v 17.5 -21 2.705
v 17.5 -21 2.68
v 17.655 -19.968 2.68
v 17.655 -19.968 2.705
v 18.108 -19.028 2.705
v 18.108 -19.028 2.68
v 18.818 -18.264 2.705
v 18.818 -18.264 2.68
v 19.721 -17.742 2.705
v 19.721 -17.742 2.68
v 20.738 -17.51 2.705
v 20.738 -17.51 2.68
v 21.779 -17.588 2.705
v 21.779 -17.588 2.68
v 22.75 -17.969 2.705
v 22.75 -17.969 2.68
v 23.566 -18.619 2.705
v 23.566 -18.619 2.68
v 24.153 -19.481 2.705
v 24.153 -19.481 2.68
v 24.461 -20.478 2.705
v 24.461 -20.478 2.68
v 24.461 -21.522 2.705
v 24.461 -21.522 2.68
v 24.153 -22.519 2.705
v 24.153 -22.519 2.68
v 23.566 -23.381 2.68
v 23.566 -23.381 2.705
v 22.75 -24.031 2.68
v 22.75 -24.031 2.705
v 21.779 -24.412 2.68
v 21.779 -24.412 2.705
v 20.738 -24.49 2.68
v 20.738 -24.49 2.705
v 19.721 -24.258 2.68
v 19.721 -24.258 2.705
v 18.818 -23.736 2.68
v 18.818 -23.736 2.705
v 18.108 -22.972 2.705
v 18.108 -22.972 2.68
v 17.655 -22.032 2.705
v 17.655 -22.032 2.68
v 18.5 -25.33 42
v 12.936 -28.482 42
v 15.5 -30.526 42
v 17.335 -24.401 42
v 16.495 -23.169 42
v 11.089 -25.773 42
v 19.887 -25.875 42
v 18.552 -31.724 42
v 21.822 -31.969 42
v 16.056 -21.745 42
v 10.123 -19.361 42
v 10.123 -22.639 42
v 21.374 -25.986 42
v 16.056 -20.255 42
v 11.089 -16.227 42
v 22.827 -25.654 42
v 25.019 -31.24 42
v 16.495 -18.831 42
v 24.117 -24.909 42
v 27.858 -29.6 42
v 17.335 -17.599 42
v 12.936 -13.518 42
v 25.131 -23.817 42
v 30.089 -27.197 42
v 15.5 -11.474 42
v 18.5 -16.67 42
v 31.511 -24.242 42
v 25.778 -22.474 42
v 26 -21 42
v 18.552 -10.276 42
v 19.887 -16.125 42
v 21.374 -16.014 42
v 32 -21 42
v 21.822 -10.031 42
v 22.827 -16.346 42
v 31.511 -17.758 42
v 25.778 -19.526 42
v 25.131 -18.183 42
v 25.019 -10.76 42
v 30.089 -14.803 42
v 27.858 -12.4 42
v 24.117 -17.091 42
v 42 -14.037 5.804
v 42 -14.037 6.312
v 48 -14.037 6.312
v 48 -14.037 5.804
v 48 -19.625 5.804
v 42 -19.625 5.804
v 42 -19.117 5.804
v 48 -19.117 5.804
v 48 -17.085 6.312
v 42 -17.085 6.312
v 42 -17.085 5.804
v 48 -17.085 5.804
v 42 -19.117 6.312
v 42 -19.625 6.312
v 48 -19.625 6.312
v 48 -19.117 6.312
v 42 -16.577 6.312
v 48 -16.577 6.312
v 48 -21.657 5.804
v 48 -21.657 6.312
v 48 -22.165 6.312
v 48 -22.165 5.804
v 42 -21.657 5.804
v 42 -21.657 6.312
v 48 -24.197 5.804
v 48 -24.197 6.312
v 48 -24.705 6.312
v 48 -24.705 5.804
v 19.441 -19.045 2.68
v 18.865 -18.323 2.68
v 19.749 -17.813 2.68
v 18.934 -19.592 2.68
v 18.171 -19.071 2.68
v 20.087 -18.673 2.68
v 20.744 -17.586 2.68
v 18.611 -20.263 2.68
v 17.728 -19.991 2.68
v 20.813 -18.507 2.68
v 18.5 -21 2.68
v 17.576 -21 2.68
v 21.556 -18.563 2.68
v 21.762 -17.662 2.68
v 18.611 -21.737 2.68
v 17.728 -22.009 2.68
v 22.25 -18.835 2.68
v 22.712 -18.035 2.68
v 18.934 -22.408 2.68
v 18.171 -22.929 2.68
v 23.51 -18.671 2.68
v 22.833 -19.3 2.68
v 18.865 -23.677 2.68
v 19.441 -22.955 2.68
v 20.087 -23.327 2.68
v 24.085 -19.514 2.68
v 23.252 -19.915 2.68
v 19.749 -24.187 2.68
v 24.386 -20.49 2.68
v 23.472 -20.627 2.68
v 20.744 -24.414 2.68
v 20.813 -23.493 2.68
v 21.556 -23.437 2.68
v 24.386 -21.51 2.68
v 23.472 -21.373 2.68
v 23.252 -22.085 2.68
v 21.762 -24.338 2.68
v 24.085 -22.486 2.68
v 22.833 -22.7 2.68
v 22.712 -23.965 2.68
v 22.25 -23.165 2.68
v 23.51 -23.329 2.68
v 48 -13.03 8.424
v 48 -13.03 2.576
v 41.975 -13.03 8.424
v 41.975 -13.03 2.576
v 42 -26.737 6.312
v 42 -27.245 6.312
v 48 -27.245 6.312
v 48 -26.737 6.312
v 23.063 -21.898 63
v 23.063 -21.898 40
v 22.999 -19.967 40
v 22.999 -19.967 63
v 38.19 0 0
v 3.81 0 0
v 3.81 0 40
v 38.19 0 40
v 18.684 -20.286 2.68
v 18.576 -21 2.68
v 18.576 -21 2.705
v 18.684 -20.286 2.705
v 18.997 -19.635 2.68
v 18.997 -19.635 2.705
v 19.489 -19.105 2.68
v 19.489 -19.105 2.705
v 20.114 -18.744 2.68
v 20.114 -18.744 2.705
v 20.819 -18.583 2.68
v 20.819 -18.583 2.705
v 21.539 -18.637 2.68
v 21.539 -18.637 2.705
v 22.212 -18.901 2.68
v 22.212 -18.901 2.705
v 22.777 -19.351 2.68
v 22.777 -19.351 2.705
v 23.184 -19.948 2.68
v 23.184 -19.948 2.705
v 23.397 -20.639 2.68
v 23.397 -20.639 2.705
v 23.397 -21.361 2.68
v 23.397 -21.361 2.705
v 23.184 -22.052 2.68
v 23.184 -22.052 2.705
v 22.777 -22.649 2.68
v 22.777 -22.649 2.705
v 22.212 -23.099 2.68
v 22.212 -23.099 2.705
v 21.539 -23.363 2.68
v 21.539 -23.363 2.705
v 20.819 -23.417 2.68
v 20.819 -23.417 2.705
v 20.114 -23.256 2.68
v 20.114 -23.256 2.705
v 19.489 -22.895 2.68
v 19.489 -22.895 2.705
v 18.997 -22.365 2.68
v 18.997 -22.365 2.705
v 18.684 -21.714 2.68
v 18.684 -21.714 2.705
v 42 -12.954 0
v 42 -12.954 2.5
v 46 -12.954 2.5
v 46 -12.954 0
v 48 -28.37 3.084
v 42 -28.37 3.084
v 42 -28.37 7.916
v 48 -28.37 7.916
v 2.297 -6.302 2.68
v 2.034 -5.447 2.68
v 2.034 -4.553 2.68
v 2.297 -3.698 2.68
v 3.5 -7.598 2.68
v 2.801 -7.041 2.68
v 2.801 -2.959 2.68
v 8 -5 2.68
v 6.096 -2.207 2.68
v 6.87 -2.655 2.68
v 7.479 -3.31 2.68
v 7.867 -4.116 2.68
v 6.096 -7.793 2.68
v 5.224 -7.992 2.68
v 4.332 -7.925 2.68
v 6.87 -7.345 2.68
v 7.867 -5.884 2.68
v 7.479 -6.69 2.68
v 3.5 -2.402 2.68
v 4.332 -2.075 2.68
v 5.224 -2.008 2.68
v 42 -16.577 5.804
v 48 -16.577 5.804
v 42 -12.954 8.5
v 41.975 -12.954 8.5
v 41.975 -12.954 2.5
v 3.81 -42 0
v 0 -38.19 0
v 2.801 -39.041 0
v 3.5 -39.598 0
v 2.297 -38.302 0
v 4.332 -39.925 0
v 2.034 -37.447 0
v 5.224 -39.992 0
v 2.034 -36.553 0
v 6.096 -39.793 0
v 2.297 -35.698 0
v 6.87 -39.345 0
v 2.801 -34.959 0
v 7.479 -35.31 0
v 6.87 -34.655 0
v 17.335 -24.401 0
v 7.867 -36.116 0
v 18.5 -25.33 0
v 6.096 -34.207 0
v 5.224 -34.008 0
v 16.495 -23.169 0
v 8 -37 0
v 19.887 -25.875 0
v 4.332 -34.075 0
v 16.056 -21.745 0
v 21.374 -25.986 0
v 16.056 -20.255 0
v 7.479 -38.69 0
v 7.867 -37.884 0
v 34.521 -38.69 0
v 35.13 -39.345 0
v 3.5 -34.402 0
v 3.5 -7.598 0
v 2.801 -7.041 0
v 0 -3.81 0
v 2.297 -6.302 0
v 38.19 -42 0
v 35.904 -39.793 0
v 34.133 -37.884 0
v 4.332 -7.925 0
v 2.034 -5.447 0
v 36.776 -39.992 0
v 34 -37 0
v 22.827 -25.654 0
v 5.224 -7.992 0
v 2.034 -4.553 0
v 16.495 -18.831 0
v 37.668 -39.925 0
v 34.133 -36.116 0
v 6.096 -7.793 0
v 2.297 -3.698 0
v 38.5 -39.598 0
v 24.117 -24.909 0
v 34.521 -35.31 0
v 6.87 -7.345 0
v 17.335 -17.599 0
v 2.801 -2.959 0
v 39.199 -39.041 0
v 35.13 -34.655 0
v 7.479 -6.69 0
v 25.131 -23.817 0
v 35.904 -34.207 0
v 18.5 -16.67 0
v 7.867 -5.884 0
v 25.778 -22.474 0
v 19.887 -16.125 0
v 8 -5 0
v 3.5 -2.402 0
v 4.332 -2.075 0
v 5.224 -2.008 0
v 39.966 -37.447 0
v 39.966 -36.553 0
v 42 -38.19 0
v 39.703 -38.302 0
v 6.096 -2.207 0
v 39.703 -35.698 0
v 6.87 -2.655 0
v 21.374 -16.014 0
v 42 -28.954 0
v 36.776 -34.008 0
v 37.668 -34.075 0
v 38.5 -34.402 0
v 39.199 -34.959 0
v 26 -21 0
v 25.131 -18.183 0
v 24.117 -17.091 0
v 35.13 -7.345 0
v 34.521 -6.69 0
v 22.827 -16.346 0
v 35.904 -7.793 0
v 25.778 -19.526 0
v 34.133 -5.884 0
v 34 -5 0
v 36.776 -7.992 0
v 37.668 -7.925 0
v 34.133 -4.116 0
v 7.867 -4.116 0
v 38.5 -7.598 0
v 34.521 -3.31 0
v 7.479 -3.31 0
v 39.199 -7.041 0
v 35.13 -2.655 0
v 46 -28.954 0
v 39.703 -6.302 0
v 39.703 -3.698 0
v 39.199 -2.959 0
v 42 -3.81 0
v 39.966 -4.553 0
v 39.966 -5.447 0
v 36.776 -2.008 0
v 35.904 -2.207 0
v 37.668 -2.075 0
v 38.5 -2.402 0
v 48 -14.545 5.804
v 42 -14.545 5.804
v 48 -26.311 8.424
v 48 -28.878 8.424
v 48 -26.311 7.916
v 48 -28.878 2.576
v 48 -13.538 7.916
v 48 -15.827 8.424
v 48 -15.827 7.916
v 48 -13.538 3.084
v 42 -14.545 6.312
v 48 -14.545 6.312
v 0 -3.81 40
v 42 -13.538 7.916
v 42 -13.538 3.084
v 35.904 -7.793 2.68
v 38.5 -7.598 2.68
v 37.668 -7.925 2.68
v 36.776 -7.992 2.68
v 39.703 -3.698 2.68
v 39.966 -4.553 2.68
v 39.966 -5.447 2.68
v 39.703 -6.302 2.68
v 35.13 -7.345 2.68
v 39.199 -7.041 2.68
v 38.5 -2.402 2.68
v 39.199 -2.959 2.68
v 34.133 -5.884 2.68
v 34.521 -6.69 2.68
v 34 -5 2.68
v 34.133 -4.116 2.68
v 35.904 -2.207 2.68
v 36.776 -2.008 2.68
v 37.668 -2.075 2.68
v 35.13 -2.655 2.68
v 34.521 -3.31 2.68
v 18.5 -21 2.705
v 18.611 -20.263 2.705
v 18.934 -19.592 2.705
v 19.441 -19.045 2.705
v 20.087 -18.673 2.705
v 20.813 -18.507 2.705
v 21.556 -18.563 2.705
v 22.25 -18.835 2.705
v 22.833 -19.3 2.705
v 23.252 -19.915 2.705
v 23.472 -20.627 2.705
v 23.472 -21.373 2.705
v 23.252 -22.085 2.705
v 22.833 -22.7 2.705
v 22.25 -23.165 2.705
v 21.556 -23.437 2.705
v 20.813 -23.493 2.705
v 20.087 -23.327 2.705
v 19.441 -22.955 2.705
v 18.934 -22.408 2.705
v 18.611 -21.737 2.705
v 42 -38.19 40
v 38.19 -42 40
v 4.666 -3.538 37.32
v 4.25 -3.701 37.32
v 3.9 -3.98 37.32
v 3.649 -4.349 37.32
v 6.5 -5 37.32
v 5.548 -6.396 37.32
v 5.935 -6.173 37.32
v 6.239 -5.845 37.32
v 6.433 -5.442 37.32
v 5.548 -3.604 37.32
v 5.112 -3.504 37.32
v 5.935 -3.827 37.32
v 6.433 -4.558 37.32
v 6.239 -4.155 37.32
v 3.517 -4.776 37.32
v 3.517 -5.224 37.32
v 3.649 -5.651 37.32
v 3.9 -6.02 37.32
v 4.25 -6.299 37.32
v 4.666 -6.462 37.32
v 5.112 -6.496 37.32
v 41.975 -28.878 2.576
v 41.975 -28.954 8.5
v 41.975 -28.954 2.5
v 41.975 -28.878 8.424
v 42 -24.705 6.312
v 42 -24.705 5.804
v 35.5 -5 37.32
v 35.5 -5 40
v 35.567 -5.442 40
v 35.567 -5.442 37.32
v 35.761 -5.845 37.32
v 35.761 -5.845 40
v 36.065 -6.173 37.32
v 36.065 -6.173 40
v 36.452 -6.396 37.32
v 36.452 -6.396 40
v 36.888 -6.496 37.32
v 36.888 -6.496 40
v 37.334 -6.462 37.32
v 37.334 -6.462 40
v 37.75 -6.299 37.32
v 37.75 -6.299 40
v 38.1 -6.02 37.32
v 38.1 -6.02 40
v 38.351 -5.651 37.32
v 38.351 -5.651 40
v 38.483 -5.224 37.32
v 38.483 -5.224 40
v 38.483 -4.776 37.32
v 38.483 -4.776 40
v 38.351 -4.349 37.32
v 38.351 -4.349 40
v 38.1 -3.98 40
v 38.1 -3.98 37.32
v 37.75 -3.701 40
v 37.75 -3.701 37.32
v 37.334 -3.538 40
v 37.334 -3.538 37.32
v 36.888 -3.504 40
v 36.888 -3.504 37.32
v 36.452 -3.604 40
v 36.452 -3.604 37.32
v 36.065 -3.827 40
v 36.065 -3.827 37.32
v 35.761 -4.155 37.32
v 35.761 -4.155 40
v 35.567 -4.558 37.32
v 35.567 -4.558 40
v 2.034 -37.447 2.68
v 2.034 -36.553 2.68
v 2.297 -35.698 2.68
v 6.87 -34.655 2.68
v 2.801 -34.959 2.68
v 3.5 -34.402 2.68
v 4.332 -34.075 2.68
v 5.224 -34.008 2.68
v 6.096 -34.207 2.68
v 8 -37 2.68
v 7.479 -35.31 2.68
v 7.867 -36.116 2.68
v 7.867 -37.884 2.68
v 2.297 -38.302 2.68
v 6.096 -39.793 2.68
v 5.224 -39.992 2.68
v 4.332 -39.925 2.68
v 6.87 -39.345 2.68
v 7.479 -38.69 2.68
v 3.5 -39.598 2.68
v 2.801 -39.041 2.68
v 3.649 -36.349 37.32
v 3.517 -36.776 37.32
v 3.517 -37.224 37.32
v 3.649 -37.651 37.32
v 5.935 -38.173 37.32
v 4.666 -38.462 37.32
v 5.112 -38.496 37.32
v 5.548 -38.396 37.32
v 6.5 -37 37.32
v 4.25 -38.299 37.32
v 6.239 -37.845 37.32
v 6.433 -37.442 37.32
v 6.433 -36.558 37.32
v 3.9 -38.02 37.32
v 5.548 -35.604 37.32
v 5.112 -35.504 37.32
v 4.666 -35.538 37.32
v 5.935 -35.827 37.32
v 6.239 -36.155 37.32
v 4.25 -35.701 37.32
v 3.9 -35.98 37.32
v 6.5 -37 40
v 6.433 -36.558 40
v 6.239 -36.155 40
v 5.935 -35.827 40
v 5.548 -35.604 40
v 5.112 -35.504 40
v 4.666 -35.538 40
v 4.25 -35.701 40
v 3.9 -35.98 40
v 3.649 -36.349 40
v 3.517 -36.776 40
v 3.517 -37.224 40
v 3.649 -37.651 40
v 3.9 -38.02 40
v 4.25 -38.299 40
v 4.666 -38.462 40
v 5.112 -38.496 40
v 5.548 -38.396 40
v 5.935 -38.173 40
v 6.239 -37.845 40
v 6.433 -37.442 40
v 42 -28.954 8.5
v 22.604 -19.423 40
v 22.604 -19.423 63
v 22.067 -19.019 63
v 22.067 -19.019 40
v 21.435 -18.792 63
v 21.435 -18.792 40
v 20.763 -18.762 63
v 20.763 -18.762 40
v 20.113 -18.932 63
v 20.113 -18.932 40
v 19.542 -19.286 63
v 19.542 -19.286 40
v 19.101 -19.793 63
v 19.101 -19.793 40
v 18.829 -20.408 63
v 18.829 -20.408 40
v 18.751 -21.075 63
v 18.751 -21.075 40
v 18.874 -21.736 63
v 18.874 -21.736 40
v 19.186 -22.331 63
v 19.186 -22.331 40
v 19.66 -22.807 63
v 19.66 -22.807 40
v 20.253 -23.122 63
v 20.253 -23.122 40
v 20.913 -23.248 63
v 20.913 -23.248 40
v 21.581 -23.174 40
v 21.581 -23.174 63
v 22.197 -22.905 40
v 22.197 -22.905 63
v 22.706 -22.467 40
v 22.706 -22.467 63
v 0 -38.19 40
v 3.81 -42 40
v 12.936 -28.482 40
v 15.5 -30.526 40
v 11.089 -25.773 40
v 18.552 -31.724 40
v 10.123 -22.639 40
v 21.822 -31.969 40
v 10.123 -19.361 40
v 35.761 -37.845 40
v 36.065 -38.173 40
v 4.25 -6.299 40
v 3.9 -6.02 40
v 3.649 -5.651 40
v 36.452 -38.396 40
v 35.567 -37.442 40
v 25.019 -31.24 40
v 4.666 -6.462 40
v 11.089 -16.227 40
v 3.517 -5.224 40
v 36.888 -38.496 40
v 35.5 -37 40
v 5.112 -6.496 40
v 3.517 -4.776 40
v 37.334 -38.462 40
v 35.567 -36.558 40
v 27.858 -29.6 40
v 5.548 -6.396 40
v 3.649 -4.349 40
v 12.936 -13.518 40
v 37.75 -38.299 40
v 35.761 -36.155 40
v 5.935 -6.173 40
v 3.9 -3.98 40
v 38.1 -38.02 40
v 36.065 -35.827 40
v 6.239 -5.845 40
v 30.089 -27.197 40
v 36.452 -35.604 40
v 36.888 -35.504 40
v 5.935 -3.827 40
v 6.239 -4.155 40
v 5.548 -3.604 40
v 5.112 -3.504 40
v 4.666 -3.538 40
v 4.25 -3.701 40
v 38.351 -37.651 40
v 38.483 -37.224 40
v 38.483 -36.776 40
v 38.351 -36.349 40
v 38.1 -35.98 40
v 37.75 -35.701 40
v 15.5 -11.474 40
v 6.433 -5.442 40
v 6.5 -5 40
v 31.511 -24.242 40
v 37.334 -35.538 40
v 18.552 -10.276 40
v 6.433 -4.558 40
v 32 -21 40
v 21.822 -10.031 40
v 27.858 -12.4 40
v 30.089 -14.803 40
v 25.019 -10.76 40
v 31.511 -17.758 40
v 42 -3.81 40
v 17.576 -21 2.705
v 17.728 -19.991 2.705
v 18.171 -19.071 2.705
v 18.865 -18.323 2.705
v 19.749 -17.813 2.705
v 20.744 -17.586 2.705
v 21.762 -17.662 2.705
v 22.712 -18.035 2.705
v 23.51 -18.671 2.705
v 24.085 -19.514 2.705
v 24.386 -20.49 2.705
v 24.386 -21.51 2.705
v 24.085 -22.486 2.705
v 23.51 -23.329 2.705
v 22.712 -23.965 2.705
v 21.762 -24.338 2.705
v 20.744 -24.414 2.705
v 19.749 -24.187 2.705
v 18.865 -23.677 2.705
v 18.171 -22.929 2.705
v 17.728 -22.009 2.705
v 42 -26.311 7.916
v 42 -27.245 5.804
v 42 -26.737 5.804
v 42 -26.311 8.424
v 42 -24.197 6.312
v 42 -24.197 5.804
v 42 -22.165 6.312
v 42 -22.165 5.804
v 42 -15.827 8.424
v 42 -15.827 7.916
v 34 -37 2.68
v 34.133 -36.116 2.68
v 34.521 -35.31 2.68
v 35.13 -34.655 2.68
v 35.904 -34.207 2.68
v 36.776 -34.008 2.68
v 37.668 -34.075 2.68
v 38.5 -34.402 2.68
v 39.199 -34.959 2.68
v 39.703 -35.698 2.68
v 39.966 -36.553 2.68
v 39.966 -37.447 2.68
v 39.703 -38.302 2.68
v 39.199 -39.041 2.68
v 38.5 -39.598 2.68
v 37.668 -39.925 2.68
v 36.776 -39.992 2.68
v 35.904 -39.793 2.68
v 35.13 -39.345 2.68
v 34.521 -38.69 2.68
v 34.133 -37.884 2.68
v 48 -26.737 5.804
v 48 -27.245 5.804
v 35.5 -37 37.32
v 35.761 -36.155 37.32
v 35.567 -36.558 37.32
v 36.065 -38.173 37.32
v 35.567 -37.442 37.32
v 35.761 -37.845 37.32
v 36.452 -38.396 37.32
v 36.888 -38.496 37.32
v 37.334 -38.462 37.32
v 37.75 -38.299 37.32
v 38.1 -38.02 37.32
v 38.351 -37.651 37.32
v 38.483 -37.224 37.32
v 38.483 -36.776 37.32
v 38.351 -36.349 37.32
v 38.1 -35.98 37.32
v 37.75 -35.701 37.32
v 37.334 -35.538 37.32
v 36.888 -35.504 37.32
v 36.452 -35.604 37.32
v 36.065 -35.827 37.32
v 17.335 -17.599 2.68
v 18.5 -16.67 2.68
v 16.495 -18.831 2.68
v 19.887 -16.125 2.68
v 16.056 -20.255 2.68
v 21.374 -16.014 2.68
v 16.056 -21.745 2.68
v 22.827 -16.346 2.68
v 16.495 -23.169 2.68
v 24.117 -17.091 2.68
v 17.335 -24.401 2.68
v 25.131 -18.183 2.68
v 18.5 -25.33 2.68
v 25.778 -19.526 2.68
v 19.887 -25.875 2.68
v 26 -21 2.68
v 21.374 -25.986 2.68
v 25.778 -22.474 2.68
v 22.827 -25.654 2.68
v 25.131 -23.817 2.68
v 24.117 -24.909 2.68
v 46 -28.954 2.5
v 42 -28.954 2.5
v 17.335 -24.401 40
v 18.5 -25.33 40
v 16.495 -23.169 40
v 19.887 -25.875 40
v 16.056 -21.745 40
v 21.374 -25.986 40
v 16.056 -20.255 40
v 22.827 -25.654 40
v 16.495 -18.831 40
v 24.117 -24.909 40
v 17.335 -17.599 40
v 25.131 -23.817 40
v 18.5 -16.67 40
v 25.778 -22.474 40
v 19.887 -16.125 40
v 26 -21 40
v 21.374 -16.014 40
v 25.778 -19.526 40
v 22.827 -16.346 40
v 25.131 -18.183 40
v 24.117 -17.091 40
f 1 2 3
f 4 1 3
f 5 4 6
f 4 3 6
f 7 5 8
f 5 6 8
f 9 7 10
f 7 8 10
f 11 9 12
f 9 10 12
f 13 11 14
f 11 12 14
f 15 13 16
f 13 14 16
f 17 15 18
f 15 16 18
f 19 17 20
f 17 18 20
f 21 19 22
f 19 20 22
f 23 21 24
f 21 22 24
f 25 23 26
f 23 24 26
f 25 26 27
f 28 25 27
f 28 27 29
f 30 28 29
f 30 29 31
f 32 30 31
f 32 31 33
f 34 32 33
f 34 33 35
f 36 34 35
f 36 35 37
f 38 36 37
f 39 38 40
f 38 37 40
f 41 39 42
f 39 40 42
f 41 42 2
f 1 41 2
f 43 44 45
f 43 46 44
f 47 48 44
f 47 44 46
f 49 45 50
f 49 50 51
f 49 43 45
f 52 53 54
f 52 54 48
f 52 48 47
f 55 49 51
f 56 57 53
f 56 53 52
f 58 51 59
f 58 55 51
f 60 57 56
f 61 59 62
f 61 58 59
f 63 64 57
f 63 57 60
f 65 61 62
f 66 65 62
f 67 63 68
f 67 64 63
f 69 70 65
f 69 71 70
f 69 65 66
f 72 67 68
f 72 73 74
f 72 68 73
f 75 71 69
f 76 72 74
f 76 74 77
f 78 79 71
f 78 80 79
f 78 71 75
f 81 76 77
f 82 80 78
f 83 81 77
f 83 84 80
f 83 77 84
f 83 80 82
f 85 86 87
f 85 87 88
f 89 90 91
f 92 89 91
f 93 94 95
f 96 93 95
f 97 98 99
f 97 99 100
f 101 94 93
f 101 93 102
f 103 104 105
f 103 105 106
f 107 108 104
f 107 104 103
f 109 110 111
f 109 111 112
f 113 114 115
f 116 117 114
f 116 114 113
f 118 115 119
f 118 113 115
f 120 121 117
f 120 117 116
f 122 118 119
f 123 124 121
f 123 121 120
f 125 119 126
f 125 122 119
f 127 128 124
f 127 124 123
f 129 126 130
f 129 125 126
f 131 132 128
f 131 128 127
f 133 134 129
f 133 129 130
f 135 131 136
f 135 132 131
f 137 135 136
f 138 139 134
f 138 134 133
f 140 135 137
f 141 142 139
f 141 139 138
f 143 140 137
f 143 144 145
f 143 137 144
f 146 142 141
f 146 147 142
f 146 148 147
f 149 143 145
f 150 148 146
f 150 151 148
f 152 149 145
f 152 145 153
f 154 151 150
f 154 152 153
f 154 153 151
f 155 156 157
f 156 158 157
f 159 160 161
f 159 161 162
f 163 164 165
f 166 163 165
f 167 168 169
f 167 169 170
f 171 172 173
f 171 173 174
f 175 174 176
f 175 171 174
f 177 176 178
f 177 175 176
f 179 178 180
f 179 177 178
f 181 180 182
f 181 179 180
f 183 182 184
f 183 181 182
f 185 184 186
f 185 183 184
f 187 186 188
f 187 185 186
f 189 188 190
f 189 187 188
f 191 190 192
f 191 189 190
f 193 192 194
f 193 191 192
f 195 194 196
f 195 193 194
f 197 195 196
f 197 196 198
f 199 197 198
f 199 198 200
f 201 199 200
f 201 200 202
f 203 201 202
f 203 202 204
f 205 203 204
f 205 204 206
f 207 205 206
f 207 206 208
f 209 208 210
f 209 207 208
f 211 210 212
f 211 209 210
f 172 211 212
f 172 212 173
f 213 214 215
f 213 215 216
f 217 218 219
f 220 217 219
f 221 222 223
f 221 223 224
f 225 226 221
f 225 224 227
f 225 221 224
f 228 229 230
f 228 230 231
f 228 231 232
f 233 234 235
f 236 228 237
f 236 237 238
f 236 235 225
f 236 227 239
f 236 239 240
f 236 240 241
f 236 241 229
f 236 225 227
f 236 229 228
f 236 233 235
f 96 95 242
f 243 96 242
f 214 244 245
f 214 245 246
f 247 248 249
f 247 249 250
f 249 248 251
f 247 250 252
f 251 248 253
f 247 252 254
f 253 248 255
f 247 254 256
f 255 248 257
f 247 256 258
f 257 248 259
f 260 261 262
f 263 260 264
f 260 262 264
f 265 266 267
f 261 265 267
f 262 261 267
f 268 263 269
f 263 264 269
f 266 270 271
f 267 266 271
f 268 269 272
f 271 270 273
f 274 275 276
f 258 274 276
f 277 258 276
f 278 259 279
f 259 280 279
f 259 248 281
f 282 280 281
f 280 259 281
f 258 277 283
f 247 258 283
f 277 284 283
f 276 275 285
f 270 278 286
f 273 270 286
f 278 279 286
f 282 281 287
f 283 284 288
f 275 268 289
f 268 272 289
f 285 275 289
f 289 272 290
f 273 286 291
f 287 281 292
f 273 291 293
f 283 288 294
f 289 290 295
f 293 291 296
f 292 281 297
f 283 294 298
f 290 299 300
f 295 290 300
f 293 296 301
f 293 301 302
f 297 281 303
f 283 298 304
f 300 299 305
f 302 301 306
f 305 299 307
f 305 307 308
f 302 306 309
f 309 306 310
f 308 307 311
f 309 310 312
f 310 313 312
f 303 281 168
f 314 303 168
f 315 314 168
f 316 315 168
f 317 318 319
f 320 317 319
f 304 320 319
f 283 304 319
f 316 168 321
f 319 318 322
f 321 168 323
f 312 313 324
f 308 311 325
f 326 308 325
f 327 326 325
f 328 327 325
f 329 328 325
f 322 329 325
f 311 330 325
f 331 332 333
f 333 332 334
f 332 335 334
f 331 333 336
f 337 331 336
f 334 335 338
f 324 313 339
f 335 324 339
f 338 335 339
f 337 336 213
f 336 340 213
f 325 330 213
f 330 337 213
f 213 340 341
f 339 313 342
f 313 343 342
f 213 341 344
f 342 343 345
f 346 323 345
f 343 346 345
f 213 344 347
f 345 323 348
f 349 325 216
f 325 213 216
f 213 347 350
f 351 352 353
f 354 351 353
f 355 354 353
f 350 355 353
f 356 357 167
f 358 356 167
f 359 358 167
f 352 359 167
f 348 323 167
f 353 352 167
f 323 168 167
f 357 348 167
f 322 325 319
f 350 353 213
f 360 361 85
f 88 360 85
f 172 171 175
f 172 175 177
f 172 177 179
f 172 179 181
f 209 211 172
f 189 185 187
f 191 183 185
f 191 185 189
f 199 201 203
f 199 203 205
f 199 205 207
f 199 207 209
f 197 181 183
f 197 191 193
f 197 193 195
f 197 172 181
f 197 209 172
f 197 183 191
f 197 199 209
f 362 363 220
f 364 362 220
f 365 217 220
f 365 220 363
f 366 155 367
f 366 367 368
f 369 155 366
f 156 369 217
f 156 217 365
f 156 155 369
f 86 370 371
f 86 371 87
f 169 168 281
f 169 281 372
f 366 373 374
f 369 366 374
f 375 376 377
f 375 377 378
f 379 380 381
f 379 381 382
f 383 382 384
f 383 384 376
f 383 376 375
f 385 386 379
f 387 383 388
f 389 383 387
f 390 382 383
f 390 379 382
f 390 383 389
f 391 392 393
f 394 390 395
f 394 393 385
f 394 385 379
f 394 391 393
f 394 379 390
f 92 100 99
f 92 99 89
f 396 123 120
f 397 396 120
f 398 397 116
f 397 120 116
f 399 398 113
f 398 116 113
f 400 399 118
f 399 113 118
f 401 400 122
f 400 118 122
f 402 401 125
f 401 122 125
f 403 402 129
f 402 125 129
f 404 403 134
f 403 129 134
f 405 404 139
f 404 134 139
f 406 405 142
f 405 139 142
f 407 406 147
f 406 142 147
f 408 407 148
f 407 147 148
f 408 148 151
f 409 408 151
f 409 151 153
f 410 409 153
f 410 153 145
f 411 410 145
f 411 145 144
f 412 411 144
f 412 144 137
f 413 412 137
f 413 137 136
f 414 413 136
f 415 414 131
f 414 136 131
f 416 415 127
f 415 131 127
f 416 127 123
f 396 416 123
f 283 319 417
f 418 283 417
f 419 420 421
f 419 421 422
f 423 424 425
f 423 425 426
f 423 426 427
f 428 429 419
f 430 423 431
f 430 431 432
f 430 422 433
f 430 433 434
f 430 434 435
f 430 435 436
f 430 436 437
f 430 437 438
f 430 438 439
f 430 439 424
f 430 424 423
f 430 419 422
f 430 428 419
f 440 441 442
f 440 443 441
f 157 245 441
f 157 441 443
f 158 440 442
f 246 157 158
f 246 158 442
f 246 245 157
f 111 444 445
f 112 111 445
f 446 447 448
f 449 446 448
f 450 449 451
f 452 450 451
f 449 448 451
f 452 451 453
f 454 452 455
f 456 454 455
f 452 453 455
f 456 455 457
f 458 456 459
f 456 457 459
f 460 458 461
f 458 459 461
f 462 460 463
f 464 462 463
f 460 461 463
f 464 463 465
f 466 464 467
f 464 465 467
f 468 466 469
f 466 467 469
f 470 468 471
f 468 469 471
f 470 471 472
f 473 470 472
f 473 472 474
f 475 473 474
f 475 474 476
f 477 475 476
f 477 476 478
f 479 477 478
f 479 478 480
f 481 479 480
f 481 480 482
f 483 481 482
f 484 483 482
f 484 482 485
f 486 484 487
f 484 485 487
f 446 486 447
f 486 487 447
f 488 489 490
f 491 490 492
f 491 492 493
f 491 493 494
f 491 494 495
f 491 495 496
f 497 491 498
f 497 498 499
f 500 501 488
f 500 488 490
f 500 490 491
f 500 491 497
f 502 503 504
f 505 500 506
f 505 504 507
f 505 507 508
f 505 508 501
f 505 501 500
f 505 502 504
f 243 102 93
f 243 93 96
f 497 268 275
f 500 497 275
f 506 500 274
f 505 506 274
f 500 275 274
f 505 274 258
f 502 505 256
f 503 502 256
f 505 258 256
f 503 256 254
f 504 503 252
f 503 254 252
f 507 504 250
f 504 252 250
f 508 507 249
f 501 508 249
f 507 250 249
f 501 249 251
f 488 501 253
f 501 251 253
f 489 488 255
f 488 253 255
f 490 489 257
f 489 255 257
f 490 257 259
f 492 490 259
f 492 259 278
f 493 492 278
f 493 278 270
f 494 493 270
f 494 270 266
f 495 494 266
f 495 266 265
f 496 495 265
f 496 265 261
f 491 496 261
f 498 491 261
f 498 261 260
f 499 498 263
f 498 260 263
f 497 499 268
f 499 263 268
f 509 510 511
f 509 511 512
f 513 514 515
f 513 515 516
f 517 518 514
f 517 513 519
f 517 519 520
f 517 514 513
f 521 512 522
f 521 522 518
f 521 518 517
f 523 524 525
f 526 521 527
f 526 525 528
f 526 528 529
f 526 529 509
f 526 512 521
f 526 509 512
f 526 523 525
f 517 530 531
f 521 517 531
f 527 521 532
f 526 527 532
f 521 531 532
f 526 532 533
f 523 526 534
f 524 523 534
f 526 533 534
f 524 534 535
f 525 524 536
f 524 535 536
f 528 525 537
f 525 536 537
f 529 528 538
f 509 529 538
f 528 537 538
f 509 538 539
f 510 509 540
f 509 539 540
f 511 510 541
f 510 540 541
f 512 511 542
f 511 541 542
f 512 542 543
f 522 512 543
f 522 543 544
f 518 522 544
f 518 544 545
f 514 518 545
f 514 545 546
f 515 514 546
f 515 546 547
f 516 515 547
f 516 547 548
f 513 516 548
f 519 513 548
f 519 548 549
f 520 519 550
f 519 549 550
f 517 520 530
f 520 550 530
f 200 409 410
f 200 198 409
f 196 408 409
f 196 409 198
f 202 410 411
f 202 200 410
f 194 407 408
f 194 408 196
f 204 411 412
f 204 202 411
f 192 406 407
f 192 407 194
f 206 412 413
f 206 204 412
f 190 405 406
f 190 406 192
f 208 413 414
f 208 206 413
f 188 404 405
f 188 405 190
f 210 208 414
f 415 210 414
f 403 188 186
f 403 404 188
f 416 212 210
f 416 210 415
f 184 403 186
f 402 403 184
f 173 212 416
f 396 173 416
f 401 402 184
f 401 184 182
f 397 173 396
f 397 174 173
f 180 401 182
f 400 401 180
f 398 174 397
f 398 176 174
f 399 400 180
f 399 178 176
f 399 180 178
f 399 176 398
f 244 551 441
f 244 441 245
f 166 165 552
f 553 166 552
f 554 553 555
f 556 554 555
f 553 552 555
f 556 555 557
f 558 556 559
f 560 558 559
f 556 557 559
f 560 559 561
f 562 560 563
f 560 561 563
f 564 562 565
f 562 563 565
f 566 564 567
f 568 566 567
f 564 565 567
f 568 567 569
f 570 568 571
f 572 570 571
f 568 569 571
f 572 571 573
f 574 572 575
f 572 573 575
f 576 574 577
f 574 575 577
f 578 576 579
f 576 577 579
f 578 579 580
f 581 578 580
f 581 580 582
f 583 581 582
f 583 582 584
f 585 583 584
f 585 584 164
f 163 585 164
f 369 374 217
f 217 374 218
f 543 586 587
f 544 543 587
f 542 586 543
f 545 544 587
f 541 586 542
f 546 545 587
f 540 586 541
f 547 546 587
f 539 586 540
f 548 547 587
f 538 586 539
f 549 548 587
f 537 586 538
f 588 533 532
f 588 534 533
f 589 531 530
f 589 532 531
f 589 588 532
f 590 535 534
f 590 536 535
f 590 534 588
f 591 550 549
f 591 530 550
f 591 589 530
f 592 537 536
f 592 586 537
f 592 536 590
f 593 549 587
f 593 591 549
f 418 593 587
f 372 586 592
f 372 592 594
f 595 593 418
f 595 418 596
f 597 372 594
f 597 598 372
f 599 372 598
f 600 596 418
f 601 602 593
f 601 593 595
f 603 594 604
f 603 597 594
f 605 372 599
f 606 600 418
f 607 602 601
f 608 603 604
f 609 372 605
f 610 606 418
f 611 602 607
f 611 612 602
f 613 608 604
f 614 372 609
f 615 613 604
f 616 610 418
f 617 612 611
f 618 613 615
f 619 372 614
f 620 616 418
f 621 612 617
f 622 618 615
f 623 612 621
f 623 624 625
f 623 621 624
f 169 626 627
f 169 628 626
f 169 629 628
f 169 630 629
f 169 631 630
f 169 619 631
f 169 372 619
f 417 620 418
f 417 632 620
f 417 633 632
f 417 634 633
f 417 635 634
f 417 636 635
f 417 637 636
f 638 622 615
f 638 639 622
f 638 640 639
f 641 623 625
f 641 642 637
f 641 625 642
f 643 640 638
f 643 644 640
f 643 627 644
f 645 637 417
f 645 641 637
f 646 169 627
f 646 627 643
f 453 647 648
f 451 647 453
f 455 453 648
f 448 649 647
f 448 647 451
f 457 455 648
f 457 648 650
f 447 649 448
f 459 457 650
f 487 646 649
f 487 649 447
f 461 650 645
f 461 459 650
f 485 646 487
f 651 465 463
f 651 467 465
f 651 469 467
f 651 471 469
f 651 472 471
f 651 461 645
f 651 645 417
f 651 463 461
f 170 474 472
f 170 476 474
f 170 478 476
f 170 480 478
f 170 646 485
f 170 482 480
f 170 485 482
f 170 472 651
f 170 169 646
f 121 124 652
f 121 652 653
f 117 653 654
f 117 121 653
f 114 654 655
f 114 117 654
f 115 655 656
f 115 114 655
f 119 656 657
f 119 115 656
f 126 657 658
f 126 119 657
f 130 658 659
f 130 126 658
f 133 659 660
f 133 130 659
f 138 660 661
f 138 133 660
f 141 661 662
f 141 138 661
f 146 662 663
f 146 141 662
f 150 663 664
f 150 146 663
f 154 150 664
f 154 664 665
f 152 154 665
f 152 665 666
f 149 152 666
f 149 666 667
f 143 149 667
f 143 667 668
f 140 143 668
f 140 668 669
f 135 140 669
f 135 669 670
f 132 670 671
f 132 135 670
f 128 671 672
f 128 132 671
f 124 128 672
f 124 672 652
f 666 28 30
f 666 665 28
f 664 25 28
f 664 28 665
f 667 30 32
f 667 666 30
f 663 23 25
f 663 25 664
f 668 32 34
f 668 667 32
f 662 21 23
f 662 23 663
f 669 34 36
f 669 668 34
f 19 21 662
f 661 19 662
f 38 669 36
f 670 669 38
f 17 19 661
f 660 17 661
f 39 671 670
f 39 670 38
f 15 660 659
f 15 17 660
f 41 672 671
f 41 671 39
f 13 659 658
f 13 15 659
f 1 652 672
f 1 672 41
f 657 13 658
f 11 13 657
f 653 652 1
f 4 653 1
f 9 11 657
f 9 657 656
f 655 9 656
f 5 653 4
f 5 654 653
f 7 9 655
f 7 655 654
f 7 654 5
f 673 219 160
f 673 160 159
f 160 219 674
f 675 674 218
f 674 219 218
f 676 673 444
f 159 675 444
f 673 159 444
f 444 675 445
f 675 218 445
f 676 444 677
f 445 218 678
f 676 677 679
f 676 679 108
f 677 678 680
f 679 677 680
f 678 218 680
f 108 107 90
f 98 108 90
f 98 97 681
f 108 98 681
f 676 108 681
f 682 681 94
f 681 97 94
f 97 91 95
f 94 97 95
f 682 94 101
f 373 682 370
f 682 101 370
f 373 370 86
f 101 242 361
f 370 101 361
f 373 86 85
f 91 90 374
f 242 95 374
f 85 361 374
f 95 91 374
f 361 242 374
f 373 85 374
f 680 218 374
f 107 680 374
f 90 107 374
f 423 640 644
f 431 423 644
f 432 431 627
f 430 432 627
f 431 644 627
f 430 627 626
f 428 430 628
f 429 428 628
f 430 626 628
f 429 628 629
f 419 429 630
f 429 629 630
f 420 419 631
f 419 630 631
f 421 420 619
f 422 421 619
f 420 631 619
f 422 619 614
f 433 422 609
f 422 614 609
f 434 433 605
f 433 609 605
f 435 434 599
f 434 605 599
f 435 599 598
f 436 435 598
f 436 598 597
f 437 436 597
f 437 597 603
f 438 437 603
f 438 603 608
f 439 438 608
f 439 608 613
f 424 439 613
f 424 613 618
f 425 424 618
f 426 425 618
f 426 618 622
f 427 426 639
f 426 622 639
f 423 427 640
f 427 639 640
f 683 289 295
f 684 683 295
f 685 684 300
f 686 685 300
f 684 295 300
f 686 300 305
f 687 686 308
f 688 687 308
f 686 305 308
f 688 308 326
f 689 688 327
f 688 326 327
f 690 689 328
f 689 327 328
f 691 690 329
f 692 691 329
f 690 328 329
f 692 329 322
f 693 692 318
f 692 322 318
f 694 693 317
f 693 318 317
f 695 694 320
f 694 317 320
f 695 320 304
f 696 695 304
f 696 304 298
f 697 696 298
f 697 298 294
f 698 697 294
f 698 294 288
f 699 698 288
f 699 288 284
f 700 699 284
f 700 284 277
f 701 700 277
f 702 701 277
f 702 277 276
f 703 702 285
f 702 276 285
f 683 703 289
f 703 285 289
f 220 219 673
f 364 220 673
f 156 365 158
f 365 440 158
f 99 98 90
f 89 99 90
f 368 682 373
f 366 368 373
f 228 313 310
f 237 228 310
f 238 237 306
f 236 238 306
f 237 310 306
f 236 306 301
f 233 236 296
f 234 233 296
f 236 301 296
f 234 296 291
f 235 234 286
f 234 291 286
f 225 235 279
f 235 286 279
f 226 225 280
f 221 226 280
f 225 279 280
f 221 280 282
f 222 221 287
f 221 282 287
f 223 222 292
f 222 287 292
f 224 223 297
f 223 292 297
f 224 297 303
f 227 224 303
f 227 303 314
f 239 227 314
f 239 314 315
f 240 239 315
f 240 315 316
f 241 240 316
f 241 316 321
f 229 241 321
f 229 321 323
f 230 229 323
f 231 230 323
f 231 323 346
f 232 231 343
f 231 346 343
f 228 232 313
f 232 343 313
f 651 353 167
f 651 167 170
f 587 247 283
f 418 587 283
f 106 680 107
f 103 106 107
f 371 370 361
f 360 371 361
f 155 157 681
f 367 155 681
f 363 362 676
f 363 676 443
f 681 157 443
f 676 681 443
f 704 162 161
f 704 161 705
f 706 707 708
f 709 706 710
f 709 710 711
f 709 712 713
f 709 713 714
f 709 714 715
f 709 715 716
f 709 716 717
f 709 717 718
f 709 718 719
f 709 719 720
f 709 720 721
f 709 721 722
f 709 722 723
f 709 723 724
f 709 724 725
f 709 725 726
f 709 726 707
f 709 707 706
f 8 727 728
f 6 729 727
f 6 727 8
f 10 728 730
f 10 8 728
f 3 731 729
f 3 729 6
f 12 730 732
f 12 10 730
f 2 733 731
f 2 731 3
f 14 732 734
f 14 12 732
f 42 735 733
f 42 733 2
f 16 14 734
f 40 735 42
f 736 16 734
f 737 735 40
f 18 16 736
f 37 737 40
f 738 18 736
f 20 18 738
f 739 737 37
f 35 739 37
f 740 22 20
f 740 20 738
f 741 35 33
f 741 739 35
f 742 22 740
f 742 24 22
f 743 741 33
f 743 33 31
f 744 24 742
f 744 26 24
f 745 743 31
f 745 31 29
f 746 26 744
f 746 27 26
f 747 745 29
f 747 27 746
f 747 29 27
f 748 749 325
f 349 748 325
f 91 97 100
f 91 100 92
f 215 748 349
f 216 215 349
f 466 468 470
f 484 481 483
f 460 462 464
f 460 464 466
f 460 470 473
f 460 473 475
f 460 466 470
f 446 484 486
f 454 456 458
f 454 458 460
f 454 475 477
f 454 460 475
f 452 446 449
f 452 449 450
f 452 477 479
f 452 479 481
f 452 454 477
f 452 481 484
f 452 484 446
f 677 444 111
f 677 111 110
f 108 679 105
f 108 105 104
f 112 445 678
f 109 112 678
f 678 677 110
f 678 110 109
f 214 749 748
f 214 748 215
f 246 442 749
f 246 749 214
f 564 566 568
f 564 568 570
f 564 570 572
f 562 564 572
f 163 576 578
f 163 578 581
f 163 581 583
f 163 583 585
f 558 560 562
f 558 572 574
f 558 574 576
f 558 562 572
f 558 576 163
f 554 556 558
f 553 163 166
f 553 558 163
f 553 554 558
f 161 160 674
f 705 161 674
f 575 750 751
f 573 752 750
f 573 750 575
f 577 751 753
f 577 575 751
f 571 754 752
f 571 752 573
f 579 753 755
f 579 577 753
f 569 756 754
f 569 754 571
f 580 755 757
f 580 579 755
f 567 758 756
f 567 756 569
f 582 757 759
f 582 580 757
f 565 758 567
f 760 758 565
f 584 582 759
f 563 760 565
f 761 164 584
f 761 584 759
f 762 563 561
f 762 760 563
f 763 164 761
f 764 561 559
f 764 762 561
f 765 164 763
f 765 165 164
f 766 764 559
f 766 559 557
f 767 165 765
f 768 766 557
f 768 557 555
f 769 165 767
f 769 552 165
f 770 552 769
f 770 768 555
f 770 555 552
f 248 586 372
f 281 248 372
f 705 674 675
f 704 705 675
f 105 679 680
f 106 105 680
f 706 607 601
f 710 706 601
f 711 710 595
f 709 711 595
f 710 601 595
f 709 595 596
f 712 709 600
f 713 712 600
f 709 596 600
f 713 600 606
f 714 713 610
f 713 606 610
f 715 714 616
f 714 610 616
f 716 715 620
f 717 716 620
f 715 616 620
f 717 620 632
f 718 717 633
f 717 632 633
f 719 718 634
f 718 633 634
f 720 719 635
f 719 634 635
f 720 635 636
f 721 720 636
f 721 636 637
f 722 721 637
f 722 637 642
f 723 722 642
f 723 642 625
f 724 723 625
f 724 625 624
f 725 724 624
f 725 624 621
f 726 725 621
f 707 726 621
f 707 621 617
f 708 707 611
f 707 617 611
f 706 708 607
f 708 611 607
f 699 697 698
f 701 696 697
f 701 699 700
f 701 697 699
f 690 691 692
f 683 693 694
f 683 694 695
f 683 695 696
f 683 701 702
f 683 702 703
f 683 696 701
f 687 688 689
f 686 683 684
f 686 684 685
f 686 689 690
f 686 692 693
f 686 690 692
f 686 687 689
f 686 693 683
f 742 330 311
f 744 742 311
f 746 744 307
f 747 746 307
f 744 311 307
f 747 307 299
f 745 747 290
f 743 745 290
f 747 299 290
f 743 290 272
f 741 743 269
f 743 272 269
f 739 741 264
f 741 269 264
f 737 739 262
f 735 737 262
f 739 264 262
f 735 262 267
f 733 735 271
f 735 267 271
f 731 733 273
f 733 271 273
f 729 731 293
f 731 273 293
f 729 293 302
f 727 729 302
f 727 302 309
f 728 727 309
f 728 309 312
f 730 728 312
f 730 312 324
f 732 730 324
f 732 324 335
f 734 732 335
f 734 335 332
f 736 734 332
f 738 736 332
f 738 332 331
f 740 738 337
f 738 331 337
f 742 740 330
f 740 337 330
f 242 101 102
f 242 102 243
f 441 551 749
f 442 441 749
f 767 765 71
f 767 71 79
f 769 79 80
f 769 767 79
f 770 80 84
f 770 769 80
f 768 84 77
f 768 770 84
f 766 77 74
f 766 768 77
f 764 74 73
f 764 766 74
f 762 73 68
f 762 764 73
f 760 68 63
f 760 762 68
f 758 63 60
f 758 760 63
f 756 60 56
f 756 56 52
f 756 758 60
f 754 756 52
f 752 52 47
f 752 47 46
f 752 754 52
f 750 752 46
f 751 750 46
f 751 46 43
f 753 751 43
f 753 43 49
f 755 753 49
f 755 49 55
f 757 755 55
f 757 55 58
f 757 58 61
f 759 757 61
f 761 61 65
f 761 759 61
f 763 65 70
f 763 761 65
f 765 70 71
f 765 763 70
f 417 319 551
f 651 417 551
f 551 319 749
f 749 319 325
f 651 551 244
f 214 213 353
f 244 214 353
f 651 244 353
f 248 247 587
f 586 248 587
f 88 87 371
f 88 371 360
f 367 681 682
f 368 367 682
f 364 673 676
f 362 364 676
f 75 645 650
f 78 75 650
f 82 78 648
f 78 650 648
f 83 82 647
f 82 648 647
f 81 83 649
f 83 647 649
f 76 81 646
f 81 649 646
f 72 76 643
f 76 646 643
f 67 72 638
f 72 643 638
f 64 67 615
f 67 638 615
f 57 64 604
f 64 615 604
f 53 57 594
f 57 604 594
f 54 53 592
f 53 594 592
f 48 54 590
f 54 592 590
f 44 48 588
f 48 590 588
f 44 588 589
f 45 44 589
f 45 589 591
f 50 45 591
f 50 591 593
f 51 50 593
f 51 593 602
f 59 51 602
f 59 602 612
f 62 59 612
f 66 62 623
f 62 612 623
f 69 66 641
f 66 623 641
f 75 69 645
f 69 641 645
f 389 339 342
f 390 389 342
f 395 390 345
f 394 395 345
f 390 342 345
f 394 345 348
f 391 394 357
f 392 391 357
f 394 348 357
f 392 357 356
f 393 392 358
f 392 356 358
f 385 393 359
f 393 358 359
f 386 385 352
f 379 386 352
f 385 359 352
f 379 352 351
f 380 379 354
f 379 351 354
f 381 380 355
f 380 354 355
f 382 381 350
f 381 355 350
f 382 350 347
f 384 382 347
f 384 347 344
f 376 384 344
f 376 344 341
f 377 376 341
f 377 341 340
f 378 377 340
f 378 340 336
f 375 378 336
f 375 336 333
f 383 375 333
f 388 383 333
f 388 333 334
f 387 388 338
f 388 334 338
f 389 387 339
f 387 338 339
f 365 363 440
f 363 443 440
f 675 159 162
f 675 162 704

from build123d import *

# Parameters (mm, degrees)
SKETCH1_W           = 42
SKETCH1_H           = 42
BOSS_EXTRUDE1_DEPTH = 40
SKETCH2_R           = 11
SKETCH2_R_2         = 5
BOSS_EXTRUDE2_DEPTH = 2
BOSS_EXTRUDE3_DEPTH = 23
SKETCH4_R           = 1.5
CUT_EXTRUDE1_DEPTH  = 2.68
SKETCH5_R           = 3
CUT_EXTRUDE2_DEPTH  = 2.68
SKETCH6_R           = 5
CUT_EXTRUDE3_DEPTH  = 2.68
SKETCH7_R           = 3.5
SKETCH7_R_2         = 3.4238
SKETCH7_R_3         = 2.5
SKETCH7_R_4         = 2.4238
CUT_EXTRUDE4_DEPTH  = 0.0254
CHAMFER1_SIZE       = 3.81
SKETCH8_W           = 2.5
SKETCH8_H           = 16
BOSS_EXTRUDE4_DEPTH = 4
SKETCH9_W           = 6
SKETCH9_H           = 16
SKETCH9_W_2         = 5.8476
SKETCH9_H_2         = 15.8476
CUT_EXTRUDE5_DEPTH  = 0.0254
SKETCH10_W          = 0.508
SKETCH10_H          = 0.508
BOSS_EXTRUDE5_DEPTH = 6


with BuildPart() as part:
    # Sketch1 → Boss-Extrude1 (new body)
    with BuildSketch(Plane.XY):
        with Locations((21, -21)):
            Rectangle(SKETCH1_W, SKETCH1_H)
    extrude(amount=BOSS_EXTRUDE1_DEPTH)

    # Sketch2 → Boss-Extrude2 (add)
    with BuildSketch(Plane.XY.offset(40)):
        with Locations((21, -21)):
            Circle(SKETCH2_R)
        with Locations((21, -21)):
            Circle(SKETCH2_R_2, mode=Mode.SUBTRACT)
    extrude(amount=BOSS_EXTRUDE2_DEPTH)

    # Sketch3 → Boss-Extrude3 (add)
    with BuildSketch(Plane.XY.offset(40)):
        with BuildLine():
            Line((23.063065241, -21.897920826), (22.998678024, -19.966662613))
            ThreePointArc((22.998678024, -19.966662613), (18.751249422, -21.074972259), (23.063065241, -21.897920826))
        make_face()
    extrude(amount=BOSS_EXTRUDE3_DEPTH)

    # Sketch4 → Cut-Extrude1 (cut)
    with BuildSketch(Plane.XY.offset(40)):
        with Locations((5, -5)):
            Circle(SKETCH4_R)
        with Locations((5, -37)):
            Circle(SKETCH4_R)
        with Locations(Location((37, -5, 0), (0, 0, 180))):
            Circle(SKETCH4_R)
        with Locations(Location((37, -37, 0), (0, 0, 180))):
            Circle(SKETCH4_R)
    extrude(amount=-CUT_EXTRUDE1_DEPTH, mode=Mode.SUBTRACT)

    # Sketch5 → Cut-Extrude2 (cut)
    with BuildSketch(Plane(origin=(0, 0, 0), x_dir=(-1, 0, 0), z_dir=(0, 0, -1))):
        with Locations((-37, -5)):
            Circle(SKETCH5_R)
        with Locations((-37, -37)):
            Circle(SKETCH5_R)
        with Locations(Location((-5, -37, 0), (0, 0, 180))):
            Circle(SKETCH5_R)
        with Locations(Location((-5, -5, 0), (0, 0, 180))):
            Circle(SKETCH5_R)
    extrude(amount=-CUT_EXTRUDE2_DEPTH, mode=Mode.SUBTRACT)

    # Sketch6 → Cut-Extrude3 (cut)
    with BuildSketch(Plane(origin=(0, 0, 0), x_dir=(-1, 0, 0), z_dir=(0, 0, -1))):
        with Locations(Location((-21, -21, 0), (0, 0, 180))):
            Circle(SKETCH6_R)
    extrude(amount=-CUT_EXTRUDE3_DEPTH, mode=Mode.SUBTRACT)

    # Sketch7 → Cut-Extrude4 (cut)
    # profile 1 of 2: a face of its own
    with BuildSketch(Plane(origin=(0, 0, 2.68), x_dir=(-1, 0, 0), z_dir=(0, 0, -1))):
        with Locations((-21, -21)):
            Circle(SKETCH7_R)
        with Locations((-21, -21)):
            Circle(SKETCH7_R_2, mode=Mode.SUBTRACT)
    # profile 2 of 2: a face of its own
    with BuildSketch(Plane(origin=(0, 0, 2.68), x_dir=(-1, 0, 0), z_dir=(0, 0, -1))):
        with Locations((-21, -21)):
            Circle(SKETCH7_R_3)
        with Locations((-21, -21)):
            Circle(SKETCH7_R_4, mode=Mode.SUBTRACT)
    extrude(amount=-CUT_EXTRUDE4_DEPTH, mode=Mode.SUBTRACT)

    # Chamfer1
    chamfer1_edges = [part.edges().sort_by_distance(p)[0] for p in [
        (0, 0, 20),
        (42, 0, 20),
        (42, -42, 20),
        (0, -42, 20),
    ]]
    chamfer(chamfer1_edges, length=CHAMFER1_SIZE)

    # Sketch8 → Boss-Extrude4 (add)
    with BuildSketch(Plane(origin=(42, 0, 0), x_dir=(0, 0, -1), z_dir=(1, 0, 0))):
        with Locations((-1.25, -20.954)):
            Rectangle(SKETCH8_W, SKETCH8_H)
    extrude(amount=BOSS_EXTRUDE4_DEPTH)

    # Sketch9 → Cut-Extrude5 (cut)
    with BuildSketch(Plane(origin=(42, 0, 0), x_dir=(0, 0, -1), z_dir=(1, 0, 0))):
        with Locations((-5.5, -20.954)):
            Rectangle(SKETCH9_W, SKETCH9_H)
        with Locations((-5.5, -20.954)):
            Rectangle(SKETCH9_W_2, SKETCH9_H_2, mode=Mode.SUBTRACT)
    extrude(amount=-CUT_EXTRUDE5_DEPTH, mode=Mode.SUBTRACT)

    # Sketch10 → Boss-Extrude5 (add)
    with BuildSketch(Plane(origin=(42, 0, 0), x_dir=(0, 0, -1), z_dir=(1, 0, 0))):
        Polygon((-7.9158, -28.3698), (-7.9158, -26.311363573), (-8.4238, -26.311363573), (-8.4238, -28.8778), (-2.5762, -28.8778), (-2.5762, -13.0302), (-8.4238, -13.0302), (-8.4238, -15.827398032), (-7.9158, -15.827398032), (-7.9158, -13.5382), (-3.0842, -13.5382), (-3.0842, -28.3698), align=None)
        with Locations((-6.058218613, -24.450923399)):
            Rectangle(SKETCH10_W, SKETCH10_H)
        with Locations((-6.058218613, -26.990923399)):
            Rectangle(SKETCH10_W, SKETCH10_H)
        with Locations((-6.058218613, -21.910923399)):
            Rectangle(SKETCH10_W, SKETCH10_H)
        with Locations((-6.058218613, -19.370923399)):
            Rectangle(SKETCH10_W, SKETCH10_H)
        with Locations((-6.058218613, -16.830923399)):
            Rectangle(SKETCH10_W, SKETCH10_H)
        with Locations((-6.058218613, -14.290923399)):
            Rectangle(SKETCH10_W, SKETCH10_H)
    extrude(amount=BOSS_EXTRUDE5_DEPTH)


solid = part.part
